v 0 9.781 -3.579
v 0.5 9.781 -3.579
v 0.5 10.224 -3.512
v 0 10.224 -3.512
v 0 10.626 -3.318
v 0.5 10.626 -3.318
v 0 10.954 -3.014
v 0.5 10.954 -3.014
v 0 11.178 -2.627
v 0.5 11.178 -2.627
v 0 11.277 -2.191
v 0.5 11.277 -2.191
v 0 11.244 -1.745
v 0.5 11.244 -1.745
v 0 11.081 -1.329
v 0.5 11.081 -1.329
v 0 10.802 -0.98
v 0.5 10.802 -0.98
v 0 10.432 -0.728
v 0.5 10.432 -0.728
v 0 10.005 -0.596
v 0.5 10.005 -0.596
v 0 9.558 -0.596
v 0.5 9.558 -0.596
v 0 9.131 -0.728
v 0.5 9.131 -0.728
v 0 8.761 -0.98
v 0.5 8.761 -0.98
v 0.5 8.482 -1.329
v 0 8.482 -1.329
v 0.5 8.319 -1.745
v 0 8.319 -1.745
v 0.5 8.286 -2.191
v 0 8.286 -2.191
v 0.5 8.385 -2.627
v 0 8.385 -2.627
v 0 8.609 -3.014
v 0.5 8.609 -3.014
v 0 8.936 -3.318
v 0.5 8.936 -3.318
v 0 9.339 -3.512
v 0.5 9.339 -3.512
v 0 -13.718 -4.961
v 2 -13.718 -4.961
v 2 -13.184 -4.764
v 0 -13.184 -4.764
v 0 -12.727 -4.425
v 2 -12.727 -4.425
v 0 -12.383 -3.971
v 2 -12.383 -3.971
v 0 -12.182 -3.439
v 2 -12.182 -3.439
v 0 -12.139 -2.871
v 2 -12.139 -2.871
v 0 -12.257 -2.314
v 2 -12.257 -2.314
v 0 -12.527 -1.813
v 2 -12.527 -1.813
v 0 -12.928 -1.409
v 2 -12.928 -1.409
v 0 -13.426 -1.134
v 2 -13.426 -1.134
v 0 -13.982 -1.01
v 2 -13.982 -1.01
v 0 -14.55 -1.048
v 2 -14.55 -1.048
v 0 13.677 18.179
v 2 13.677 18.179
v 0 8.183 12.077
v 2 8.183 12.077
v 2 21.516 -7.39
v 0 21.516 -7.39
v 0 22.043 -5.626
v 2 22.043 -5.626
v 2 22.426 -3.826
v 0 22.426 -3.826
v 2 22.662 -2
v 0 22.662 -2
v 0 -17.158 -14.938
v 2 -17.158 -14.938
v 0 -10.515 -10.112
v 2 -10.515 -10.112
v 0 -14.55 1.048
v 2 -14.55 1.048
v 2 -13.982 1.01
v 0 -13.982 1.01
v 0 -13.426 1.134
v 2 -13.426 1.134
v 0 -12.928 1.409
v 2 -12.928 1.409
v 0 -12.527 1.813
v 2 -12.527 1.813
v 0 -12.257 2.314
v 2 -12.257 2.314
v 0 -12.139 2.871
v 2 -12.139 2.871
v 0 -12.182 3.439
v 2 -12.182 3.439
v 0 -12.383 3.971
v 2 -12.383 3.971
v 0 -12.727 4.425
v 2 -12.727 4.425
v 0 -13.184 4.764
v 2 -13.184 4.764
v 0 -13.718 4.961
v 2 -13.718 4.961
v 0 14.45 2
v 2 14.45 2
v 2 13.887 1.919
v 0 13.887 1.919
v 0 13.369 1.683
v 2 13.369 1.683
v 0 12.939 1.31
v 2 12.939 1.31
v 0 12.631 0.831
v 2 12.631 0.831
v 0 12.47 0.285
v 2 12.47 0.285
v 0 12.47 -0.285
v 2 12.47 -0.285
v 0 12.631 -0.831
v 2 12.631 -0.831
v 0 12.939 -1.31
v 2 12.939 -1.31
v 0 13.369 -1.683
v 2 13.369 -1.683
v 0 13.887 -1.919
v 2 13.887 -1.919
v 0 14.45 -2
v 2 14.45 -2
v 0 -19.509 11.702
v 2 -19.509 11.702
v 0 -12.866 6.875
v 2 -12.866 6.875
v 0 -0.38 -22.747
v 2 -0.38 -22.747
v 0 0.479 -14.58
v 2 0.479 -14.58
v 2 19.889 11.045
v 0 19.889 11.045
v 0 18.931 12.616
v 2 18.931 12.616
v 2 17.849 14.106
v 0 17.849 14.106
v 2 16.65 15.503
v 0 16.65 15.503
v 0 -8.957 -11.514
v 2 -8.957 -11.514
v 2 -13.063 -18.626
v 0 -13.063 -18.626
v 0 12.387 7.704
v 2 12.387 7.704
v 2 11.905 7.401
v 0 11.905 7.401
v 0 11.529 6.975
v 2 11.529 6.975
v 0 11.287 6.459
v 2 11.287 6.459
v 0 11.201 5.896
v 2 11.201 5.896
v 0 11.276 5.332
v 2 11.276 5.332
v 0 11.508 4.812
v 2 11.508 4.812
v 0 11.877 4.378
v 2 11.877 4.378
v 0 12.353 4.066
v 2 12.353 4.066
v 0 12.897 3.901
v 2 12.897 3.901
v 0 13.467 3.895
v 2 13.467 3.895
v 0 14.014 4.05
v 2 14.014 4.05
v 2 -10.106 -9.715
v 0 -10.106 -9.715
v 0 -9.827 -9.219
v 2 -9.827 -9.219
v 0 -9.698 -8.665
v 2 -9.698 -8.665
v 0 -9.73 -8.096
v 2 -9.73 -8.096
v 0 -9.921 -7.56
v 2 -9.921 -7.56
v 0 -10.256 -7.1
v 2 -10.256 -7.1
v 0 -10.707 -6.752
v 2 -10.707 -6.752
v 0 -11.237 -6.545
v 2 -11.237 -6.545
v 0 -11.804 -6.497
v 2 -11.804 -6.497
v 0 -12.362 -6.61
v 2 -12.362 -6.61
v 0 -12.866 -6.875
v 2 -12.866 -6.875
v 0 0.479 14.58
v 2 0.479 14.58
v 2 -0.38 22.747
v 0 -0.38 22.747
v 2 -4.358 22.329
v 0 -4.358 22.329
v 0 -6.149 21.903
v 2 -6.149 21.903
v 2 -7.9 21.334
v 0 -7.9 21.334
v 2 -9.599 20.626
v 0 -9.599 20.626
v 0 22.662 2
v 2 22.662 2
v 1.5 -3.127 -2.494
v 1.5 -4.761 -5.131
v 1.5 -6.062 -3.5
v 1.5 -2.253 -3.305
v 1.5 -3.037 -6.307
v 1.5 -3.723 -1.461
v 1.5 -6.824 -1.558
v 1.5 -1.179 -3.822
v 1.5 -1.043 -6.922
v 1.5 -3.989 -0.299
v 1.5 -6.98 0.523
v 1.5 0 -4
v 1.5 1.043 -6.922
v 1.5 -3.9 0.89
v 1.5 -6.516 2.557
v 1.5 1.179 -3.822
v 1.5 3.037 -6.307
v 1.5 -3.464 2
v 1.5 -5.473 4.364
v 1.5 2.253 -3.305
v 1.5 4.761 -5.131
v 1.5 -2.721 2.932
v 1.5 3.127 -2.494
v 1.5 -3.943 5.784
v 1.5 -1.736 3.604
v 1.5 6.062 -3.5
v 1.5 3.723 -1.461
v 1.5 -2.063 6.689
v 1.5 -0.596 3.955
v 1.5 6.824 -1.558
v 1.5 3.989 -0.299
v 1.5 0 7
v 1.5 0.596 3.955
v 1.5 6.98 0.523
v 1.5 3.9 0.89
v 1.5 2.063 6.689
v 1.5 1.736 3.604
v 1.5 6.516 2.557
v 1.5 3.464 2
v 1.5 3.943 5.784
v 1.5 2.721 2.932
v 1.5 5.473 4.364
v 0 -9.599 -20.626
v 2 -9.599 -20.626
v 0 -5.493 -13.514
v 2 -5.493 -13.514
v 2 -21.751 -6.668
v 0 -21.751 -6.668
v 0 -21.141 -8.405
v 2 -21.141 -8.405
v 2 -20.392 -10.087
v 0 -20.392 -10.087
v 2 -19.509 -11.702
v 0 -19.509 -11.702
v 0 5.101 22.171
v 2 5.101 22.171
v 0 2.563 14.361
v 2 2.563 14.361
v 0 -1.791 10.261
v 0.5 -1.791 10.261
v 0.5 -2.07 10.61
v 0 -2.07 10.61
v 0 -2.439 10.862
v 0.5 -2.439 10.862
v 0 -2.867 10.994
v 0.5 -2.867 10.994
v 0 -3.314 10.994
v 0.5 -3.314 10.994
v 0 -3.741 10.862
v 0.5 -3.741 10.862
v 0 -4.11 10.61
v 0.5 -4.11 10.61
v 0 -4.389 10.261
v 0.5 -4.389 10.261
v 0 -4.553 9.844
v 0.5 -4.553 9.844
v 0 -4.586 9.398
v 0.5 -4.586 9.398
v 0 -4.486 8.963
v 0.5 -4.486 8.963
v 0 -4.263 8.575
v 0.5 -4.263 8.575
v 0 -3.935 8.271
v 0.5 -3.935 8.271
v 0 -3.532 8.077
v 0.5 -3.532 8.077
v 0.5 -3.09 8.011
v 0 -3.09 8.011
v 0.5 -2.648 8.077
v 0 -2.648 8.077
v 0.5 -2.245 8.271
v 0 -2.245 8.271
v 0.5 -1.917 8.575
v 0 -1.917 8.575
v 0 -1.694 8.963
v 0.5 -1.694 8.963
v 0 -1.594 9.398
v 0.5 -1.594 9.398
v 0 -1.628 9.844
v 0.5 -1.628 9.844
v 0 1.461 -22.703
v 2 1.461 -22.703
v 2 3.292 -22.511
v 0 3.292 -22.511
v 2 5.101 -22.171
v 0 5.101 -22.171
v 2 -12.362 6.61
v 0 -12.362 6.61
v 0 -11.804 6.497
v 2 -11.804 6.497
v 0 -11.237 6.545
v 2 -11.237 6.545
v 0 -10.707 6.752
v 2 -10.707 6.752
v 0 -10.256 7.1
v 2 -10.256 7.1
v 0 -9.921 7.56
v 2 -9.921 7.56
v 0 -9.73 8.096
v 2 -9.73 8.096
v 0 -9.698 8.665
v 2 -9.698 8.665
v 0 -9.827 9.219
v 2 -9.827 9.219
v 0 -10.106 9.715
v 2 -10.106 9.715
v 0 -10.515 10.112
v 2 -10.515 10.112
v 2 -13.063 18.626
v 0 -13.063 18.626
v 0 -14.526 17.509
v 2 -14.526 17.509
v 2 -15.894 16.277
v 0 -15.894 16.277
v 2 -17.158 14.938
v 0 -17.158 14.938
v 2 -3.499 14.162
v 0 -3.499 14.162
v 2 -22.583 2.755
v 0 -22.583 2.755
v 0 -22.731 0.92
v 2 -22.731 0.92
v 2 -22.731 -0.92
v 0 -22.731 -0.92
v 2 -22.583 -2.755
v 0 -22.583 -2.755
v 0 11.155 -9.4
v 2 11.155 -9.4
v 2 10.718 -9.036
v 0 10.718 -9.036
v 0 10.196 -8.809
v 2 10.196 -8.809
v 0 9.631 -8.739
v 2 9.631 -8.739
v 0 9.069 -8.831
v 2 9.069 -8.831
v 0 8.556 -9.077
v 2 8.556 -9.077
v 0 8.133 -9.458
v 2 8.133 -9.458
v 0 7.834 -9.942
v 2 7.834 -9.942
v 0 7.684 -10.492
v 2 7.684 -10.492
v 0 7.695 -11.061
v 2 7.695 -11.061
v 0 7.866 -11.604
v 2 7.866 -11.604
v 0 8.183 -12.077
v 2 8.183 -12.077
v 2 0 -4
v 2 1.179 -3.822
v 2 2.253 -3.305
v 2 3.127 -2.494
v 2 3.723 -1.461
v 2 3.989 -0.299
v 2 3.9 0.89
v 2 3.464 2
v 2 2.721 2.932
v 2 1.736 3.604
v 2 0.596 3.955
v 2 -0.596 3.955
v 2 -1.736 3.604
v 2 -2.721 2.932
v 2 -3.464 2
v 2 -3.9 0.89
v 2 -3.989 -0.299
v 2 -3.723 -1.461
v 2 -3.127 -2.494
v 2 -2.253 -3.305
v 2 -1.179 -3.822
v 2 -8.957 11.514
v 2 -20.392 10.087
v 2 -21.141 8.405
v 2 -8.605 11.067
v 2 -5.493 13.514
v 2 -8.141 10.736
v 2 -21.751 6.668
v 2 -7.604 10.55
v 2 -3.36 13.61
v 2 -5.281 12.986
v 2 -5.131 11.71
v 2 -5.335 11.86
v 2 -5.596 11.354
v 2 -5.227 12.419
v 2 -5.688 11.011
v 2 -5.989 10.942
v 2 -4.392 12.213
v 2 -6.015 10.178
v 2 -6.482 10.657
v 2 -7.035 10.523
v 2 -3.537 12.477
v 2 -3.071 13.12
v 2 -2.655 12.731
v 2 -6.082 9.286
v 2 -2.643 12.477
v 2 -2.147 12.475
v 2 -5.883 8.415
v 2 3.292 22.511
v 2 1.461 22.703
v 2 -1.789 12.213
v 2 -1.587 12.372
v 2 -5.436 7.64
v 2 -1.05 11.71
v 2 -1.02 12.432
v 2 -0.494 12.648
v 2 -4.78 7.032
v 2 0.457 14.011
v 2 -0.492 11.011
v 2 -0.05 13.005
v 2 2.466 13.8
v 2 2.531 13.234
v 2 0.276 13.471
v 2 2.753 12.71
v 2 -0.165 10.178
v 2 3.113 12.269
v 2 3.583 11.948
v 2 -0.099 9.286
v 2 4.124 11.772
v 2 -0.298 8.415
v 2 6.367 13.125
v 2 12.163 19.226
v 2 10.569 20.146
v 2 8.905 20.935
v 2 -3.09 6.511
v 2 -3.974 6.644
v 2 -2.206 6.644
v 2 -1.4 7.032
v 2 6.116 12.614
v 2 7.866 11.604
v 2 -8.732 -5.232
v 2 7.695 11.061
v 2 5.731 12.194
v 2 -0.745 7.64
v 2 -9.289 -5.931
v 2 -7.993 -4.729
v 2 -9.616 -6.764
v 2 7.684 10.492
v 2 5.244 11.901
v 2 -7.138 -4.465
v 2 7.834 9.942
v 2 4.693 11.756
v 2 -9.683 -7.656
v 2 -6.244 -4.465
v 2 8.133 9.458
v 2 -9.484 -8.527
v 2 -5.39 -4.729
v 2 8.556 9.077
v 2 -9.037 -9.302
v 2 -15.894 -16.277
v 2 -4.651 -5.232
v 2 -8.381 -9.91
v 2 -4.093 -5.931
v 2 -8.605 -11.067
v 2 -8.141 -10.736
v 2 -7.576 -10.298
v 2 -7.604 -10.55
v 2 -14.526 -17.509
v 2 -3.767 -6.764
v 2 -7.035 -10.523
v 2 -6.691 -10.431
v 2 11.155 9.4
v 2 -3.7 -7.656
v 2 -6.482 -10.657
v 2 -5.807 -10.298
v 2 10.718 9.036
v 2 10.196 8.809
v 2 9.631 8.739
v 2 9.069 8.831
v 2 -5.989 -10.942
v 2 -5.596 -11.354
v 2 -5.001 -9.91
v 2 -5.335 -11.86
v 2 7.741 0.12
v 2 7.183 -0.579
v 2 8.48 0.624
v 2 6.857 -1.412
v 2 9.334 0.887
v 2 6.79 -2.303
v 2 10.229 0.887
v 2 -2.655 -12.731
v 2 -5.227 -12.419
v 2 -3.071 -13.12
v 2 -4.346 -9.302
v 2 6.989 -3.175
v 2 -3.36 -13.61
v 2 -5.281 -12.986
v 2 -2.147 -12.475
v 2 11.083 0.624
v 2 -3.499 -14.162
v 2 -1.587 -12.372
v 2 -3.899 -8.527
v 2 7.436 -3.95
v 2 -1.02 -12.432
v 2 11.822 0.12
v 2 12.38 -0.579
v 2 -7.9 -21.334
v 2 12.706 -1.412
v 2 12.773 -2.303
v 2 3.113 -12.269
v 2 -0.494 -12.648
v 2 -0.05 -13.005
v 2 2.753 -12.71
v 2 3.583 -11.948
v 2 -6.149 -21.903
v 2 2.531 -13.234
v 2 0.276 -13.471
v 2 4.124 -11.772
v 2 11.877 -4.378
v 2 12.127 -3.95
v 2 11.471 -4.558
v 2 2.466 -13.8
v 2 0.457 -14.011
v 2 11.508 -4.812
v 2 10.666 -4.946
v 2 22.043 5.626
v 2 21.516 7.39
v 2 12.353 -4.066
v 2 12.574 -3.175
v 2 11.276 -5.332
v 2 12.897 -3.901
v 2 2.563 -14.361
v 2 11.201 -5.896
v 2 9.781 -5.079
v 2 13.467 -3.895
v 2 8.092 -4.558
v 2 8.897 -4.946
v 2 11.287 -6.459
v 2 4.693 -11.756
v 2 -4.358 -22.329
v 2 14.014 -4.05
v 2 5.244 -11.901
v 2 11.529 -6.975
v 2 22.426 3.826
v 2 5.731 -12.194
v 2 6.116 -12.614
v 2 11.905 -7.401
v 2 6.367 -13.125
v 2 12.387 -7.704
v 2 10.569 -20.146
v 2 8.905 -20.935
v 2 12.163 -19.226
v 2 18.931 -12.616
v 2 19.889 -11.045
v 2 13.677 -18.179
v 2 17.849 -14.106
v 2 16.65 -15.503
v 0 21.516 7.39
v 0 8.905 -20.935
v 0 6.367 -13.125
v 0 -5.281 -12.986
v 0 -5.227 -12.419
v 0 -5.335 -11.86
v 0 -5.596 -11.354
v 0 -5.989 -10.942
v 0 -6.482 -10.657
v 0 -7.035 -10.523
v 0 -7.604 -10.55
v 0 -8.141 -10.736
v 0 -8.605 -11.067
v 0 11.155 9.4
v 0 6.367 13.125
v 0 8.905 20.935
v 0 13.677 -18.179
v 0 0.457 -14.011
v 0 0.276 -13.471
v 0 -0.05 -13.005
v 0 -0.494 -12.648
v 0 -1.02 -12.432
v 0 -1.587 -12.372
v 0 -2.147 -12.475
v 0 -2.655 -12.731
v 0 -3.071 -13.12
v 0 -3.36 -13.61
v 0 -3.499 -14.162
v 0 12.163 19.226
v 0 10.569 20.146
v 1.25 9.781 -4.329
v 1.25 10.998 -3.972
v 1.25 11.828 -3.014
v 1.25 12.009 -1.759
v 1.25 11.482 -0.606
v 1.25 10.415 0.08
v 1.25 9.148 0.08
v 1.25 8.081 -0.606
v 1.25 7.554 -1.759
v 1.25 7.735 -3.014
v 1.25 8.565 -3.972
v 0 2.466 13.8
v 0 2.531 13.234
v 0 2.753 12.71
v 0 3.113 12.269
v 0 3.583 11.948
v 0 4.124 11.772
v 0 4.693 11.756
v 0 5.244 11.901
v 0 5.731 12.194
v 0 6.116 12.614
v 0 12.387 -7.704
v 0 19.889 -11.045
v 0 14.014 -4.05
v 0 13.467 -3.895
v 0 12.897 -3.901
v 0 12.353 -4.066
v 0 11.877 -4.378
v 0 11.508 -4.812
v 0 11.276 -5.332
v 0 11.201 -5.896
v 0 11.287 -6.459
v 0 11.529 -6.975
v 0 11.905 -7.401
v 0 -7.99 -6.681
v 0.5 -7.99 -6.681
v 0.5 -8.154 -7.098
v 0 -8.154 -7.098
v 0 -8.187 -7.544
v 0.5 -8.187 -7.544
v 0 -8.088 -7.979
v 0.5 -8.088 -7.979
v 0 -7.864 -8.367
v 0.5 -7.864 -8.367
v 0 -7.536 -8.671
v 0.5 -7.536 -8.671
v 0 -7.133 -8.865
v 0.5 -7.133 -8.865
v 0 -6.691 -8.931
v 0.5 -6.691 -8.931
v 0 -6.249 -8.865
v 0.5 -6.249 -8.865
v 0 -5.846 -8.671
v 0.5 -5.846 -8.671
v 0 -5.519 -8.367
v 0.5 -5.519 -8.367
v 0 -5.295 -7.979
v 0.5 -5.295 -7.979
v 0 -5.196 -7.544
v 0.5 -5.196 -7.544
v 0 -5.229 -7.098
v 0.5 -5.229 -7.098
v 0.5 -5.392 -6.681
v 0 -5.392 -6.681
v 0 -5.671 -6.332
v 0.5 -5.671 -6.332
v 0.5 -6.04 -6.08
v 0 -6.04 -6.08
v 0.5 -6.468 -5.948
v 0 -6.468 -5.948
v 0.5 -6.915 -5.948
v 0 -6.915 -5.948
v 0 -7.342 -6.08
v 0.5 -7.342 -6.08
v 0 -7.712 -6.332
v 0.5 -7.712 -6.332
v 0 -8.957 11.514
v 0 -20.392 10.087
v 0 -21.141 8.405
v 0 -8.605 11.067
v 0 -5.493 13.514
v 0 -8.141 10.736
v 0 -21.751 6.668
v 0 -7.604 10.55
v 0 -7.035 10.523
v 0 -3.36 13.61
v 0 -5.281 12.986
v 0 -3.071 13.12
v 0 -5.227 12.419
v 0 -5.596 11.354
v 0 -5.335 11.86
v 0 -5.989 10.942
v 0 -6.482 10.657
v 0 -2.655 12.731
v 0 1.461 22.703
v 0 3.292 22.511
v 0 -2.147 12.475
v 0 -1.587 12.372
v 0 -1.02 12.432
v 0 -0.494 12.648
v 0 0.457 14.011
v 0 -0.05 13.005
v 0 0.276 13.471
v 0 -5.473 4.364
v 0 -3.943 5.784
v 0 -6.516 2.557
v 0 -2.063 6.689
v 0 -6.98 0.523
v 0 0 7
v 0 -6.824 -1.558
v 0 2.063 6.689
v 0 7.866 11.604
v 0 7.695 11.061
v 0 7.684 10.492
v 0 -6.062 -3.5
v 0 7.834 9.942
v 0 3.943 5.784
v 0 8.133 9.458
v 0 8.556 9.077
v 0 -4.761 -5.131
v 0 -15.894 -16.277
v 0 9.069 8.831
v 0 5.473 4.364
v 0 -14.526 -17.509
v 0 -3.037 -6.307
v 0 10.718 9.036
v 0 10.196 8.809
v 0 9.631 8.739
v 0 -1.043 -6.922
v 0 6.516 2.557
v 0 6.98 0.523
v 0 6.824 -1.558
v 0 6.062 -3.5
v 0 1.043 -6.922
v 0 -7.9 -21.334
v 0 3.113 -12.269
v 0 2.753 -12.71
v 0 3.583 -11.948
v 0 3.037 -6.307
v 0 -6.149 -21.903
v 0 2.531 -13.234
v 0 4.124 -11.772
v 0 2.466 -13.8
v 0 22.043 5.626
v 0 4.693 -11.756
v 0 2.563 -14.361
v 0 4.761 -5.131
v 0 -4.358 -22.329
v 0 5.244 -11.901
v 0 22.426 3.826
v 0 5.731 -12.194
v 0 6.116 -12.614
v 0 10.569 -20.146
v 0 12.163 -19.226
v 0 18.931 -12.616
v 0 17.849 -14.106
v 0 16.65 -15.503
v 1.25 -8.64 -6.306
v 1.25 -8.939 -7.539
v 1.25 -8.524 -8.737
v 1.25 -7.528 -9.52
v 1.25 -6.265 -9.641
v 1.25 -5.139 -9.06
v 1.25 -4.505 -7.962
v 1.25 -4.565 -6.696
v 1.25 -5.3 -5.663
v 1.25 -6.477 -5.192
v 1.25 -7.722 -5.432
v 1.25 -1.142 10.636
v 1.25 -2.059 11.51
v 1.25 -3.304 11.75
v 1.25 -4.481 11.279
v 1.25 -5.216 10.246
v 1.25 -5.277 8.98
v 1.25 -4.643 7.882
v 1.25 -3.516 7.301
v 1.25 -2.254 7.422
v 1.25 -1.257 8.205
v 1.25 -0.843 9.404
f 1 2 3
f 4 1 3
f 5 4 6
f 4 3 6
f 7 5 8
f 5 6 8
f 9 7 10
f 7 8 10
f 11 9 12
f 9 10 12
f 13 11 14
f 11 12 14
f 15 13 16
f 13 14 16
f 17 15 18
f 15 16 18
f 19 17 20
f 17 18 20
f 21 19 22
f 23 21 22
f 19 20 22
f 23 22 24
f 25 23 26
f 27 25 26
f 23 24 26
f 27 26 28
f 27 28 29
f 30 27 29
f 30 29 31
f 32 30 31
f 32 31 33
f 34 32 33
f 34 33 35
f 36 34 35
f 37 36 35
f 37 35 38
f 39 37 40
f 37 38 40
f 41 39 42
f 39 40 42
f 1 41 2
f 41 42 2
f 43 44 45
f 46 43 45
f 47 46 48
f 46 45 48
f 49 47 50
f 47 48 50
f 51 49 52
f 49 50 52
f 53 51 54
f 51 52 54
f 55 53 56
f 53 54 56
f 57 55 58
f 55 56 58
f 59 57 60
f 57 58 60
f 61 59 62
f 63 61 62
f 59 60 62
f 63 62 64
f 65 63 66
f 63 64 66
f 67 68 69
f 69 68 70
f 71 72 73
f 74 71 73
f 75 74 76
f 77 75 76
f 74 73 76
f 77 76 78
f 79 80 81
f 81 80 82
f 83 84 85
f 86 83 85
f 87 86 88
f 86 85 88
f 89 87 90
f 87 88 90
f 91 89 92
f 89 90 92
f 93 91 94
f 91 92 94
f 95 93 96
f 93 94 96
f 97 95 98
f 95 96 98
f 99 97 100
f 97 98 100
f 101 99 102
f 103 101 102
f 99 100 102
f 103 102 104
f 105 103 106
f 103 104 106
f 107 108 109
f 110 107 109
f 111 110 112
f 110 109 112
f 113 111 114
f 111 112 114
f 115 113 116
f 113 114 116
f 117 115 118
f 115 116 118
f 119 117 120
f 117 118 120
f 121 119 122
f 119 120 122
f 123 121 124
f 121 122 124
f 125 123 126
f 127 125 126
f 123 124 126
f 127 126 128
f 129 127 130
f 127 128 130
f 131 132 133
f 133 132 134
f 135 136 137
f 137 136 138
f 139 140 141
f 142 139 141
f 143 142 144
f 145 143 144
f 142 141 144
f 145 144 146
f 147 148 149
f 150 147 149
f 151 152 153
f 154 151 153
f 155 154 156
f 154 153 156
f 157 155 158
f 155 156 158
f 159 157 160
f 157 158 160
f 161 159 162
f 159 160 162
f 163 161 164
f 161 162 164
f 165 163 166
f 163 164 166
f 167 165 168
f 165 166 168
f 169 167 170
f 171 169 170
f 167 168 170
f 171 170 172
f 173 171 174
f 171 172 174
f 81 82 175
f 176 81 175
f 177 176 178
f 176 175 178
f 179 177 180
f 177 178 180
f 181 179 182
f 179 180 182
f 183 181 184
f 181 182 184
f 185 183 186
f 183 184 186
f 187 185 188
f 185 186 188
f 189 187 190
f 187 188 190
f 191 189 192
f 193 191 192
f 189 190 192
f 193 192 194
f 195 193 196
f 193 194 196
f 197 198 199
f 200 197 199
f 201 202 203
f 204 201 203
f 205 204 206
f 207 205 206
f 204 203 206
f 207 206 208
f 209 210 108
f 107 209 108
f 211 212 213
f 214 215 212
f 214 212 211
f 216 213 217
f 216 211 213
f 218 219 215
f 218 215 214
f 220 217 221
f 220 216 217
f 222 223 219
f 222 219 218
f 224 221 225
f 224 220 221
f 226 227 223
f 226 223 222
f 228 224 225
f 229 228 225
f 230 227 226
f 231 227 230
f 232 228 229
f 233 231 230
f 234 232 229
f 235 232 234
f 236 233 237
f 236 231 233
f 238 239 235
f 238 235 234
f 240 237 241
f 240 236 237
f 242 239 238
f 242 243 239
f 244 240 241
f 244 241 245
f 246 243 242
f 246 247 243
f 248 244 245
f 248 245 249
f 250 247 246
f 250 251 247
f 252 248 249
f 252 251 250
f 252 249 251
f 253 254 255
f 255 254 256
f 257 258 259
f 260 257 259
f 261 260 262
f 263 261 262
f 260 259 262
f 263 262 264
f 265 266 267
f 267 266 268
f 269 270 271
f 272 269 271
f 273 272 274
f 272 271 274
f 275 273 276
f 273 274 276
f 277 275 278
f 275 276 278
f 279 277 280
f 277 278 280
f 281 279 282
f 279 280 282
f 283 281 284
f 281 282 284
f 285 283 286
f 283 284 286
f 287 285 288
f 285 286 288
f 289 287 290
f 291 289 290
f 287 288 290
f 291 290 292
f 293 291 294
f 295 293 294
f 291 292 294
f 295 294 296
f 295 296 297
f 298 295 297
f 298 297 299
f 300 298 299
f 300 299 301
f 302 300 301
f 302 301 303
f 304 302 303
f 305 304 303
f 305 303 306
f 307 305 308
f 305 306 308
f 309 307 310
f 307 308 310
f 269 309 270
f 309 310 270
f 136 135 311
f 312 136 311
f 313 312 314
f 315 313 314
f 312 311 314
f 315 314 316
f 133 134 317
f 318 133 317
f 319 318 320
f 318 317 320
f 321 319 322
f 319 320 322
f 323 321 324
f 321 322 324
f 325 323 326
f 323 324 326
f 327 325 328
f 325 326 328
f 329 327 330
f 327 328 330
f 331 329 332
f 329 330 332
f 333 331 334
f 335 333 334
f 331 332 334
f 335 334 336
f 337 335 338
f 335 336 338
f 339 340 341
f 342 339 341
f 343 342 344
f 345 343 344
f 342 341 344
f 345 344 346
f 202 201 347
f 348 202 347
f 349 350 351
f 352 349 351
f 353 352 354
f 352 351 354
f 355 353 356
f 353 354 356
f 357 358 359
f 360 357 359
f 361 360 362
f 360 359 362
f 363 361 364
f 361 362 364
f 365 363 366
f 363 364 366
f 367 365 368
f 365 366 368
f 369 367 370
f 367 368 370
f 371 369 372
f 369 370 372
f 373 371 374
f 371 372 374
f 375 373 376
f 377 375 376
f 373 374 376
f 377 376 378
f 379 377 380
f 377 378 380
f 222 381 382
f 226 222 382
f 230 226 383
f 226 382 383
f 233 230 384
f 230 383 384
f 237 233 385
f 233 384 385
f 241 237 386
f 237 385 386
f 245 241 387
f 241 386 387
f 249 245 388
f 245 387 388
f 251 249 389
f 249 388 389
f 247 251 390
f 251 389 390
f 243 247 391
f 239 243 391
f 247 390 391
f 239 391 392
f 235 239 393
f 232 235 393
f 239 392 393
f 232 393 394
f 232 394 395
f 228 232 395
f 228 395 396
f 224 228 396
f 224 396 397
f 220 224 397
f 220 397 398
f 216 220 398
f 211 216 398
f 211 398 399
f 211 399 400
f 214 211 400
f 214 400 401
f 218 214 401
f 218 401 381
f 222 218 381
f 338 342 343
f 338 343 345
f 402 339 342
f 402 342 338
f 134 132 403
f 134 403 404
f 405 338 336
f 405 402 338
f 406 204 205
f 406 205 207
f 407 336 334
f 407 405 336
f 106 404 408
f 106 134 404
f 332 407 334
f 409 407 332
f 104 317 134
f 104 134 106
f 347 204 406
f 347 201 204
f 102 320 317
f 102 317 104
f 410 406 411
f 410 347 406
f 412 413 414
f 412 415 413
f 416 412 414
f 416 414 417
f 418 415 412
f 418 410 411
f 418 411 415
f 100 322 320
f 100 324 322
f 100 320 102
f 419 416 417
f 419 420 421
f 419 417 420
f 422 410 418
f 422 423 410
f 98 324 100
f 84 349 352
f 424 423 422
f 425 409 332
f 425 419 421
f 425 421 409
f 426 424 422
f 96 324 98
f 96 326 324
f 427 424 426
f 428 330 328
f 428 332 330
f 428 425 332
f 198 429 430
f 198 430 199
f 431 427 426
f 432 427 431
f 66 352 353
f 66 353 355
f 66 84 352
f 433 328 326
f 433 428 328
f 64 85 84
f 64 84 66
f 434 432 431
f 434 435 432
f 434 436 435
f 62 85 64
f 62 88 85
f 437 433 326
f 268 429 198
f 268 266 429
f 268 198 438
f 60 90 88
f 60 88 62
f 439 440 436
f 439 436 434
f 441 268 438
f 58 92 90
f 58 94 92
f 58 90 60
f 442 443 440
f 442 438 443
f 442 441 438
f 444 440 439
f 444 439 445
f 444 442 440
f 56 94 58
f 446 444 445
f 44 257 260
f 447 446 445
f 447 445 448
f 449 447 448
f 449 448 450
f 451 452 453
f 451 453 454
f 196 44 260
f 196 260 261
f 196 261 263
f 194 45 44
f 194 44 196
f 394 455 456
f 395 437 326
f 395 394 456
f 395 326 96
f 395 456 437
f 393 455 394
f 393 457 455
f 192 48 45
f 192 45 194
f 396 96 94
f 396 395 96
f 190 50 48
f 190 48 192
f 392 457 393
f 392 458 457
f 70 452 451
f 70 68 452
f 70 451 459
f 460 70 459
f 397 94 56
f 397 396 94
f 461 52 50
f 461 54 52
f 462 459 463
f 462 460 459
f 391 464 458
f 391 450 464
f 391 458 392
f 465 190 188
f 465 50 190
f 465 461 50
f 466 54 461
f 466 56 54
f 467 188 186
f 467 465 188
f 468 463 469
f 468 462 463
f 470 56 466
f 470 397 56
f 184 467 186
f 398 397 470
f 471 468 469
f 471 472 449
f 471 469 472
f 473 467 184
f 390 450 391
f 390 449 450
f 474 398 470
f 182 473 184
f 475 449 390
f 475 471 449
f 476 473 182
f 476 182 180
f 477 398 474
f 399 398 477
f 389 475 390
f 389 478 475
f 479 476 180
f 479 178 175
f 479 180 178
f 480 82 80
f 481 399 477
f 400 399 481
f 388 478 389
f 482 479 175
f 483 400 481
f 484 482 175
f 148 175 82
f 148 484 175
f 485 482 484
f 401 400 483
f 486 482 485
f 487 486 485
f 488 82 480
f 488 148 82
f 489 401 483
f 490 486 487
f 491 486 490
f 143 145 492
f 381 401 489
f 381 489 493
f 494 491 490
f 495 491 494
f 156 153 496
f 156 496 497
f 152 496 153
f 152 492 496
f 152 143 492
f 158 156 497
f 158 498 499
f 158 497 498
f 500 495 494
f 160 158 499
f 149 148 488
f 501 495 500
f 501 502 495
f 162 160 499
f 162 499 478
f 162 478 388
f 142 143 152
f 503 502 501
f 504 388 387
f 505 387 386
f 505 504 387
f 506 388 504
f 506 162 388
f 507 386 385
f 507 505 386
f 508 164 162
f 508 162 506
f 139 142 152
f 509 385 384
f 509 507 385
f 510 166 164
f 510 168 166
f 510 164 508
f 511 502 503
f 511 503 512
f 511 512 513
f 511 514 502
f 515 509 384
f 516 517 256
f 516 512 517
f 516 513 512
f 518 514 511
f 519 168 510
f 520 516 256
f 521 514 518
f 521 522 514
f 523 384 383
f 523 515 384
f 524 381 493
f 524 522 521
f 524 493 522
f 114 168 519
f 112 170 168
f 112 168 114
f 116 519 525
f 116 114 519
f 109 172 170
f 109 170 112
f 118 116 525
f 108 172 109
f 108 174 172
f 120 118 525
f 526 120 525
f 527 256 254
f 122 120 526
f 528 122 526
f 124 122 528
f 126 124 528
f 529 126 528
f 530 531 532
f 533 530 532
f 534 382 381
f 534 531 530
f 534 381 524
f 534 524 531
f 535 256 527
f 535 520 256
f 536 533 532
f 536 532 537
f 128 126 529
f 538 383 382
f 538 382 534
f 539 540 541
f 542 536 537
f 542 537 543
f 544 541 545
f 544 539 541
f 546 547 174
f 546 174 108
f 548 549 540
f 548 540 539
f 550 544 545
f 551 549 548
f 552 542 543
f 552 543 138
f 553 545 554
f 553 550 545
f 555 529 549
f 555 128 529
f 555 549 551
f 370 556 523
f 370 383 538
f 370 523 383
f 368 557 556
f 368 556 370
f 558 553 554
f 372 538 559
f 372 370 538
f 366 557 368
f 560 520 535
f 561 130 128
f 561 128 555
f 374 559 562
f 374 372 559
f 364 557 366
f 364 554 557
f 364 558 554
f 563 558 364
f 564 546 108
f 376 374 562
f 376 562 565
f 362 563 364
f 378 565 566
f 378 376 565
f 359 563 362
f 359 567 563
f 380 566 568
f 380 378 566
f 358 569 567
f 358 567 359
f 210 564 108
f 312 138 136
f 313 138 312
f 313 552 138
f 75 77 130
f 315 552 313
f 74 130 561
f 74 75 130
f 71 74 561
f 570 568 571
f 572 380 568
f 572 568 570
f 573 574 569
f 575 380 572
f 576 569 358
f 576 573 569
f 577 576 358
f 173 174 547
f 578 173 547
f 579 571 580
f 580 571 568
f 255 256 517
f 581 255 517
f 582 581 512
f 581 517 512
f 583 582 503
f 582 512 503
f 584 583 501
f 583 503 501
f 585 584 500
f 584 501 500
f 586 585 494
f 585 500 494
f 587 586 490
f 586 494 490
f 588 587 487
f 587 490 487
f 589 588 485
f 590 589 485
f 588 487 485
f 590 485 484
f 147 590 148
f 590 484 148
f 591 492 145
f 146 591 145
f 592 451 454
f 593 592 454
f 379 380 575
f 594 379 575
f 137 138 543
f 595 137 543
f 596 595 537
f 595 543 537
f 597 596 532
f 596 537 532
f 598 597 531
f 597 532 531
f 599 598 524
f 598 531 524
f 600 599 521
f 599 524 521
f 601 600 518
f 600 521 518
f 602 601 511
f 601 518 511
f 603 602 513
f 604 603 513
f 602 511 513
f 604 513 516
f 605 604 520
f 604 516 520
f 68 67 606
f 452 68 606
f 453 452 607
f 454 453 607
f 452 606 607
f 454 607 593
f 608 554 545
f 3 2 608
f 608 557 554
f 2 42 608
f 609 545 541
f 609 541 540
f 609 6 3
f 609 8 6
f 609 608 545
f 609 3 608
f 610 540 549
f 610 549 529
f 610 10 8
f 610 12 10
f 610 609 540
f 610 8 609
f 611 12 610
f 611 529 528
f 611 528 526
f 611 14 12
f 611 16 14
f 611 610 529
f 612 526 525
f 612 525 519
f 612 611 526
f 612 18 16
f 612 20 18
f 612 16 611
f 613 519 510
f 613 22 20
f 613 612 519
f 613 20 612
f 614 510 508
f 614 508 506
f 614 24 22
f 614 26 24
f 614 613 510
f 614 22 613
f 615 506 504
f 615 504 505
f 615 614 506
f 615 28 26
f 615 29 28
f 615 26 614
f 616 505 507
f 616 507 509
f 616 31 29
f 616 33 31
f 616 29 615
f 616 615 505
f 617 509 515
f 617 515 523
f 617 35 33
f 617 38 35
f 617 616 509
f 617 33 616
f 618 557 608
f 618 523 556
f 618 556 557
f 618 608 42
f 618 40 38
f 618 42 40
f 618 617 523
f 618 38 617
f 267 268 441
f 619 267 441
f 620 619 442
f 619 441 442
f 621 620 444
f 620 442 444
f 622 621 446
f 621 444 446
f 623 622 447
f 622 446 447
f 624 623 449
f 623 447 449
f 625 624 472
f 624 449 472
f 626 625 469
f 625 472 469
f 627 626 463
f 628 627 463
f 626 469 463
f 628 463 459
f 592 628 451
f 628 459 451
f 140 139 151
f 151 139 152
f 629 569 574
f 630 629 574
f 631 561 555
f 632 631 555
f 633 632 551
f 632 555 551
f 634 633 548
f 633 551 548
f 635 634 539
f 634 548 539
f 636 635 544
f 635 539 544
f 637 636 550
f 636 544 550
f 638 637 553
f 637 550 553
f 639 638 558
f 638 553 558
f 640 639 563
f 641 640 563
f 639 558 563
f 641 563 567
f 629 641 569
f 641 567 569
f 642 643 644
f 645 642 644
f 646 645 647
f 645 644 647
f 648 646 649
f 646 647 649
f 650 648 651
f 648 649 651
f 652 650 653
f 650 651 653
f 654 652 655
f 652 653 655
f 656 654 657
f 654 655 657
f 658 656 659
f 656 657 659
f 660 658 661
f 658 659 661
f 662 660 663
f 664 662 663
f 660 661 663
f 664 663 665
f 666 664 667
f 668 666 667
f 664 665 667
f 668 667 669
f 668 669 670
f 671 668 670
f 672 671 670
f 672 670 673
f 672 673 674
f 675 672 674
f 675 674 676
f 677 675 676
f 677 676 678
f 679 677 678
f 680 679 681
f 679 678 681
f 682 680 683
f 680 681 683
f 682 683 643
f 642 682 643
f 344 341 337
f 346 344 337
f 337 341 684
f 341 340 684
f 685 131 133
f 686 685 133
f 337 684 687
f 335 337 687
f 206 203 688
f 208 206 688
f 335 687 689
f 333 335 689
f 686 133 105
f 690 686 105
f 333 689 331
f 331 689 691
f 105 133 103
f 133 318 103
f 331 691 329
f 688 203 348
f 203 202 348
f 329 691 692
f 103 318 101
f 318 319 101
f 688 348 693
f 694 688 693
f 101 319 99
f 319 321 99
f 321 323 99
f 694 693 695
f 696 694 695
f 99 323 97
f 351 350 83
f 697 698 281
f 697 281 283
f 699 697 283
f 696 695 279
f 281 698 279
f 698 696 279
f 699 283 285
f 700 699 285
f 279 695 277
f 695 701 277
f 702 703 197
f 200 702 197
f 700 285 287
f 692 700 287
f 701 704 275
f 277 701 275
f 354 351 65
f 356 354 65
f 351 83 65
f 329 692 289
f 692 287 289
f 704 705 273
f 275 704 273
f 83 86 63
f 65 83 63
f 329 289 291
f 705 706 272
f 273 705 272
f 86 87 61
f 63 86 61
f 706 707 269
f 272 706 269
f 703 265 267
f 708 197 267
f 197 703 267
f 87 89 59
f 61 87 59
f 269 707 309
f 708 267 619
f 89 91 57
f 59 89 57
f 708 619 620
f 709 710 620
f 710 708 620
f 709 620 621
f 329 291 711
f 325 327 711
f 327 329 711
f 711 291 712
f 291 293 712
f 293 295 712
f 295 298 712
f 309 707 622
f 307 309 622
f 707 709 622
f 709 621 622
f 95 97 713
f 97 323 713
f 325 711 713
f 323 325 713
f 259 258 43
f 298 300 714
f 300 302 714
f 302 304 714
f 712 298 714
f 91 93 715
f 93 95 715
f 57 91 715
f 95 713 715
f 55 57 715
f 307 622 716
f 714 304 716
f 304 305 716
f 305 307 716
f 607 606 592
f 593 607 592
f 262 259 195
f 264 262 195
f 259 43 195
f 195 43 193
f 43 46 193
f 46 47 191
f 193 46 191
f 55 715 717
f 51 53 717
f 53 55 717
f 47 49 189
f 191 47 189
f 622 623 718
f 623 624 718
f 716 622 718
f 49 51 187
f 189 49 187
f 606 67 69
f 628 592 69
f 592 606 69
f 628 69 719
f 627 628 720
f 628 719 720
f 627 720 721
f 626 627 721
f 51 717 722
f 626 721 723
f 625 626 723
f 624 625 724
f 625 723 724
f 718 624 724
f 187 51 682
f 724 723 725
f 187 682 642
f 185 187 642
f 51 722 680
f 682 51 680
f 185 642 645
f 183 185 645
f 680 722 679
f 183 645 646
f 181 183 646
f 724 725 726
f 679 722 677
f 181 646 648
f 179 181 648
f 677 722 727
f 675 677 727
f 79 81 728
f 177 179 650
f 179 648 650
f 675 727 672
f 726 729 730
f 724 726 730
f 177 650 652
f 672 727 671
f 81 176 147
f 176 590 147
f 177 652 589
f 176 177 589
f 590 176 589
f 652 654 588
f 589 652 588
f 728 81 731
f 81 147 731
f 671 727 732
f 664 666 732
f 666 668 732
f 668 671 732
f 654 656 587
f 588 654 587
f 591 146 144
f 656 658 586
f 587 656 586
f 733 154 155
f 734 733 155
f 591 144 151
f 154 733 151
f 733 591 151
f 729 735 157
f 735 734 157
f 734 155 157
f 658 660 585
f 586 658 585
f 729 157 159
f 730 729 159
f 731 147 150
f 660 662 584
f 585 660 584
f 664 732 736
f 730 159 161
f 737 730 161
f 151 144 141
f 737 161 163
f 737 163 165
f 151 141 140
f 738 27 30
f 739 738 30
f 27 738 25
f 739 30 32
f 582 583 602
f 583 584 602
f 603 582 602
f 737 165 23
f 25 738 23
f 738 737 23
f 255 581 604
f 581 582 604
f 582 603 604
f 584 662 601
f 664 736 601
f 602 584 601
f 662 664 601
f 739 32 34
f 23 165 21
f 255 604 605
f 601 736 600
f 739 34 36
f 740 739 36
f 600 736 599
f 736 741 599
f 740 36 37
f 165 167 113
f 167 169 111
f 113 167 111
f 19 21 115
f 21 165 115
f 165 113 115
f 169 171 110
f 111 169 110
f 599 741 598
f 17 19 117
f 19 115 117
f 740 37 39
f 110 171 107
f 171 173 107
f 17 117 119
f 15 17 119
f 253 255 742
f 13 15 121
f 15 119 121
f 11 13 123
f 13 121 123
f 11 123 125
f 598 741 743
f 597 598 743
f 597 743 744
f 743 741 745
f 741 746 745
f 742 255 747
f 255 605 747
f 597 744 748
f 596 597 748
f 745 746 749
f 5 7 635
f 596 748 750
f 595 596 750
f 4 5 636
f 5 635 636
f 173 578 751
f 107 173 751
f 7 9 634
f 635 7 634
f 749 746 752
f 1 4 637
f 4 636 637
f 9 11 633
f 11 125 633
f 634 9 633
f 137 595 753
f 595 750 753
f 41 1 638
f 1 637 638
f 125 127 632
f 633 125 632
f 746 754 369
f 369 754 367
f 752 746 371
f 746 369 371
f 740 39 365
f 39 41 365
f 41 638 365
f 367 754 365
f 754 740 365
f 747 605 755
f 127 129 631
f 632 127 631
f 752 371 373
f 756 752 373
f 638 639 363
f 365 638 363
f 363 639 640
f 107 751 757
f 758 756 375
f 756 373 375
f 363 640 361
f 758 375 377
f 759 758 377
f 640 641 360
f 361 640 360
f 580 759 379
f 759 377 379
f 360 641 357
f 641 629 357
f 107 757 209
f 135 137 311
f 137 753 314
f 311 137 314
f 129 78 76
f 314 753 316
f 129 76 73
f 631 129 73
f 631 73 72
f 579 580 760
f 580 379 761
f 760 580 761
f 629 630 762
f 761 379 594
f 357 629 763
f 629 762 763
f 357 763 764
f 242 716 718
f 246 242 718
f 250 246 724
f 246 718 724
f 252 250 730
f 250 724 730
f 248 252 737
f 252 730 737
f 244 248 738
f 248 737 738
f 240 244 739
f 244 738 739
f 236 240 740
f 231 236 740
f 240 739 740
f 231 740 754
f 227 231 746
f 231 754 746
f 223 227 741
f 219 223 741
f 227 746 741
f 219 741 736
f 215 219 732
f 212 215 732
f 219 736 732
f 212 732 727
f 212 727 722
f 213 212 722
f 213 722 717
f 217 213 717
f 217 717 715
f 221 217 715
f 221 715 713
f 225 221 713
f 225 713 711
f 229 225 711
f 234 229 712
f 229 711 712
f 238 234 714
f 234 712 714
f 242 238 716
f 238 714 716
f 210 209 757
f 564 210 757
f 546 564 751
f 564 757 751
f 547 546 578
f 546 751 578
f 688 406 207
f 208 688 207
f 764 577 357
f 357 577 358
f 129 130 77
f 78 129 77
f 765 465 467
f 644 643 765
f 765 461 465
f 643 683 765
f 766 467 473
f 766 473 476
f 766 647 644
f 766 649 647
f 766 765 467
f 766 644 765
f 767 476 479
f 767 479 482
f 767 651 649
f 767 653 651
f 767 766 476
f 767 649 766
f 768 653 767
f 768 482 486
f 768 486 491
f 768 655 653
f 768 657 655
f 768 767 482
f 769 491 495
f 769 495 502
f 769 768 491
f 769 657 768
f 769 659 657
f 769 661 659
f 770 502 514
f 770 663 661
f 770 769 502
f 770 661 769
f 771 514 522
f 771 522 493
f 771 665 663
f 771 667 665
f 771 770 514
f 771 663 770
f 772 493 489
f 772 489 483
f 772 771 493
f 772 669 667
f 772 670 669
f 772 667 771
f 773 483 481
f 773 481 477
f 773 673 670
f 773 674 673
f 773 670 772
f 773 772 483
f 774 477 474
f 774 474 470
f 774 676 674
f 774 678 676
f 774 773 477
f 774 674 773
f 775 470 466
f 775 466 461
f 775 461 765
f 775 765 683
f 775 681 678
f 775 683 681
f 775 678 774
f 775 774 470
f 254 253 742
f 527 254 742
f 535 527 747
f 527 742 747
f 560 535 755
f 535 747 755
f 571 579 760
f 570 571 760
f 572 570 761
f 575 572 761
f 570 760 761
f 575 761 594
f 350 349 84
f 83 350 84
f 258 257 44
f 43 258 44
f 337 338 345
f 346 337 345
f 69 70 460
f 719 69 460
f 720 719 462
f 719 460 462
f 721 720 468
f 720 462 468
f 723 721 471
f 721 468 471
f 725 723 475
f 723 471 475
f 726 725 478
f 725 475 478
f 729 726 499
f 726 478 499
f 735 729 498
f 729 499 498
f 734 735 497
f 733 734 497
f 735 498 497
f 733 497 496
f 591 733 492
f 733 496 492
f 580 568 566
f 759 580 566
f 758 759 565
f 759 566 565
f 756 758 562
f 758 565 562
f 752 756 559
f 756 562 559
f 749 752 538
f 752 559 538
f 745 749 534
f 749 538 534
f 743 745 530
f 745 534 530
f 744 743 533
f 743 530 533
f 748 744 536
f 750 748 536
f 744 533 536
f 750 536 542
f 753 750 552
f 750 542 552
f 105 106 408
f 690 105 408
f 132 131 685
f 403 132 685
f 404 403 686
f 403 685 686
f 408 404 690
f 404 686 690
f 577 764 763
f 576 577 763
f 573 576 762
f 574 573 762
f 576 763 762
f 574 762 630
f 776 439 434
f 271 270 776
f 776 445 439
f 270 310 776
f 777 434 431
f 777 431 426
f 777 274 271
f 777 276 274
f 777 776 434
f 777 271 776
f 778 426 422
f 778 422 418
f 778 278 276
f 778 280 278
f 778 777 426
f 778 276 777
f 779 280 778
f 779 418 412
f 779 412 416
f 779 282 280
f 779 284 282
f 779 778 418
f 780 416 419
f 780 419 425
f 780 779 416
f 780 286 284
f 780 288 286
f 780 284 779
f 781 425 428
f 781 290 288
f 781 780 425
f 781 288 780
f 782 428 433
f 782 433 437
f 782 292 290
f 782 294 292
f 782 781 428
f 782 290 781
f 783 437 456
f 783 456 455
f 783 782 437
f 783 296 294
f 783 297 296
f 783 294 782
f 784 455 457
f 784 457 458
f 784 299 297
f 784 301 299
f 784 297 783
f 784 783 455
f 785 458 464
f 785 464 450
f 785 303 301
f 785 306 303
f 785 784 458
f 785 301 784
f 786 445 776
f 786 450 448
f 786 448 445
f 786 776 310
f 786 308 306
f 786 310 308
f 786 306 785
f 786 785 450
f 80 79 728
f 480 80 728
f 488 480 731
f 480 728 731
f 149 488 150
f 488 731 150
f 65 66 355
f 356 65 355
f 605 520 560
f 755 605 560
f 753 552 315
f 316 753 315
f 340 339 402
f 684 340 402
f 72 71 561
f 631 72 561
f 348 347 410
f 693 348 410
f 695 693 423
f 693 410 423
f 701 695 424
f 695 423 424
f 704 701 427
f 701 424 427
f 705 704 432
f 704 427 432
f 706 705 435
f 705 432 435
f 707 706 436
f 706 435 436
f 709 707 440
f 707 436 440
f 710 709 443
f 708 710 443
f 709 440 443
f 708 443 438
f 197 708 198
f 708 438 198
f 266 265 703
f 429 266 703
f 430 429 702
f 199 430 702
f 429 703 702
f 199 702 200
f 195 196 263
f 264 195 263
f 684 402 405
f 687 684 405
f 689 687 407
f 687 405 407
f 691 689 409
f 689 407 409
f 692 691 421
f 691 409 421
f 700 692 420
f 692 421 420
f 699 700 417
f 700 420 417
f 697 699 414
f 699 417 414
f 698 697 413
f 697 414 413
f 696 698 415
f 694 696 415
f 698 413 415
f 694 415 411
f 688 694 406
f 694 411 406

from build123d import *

# Parameters (mm, degrees)
SKETCH1_R                    = 22.75
BOSS_EXTRUDE1_DEPTH          = 2
CUT_EXTRUDE2_REACH           = 4
SKETCH3_R                    = 4
SKETCH2_R                    = 1.5
CUT_EXTRUDE1_DEPTH           = 2
CHAMFER1_SIZE                = 1.5
CIRPATTERN1_COUNT            = 3
CHAMFER1_OF_CIRPATTERN1_SIZE = 1.5
CUT_EXTRUDE3_DEPTH           = 2
CIRPATTERN2_COUNT            = 15
SKETCH5_R                    = 7
CUT_EXTRUDE4_DEPTH           = 1.5


with BuildPart() as part:
    # Sketch1 → Boss-Extrude1 (new body)
    with BuildSketch(Plane(origin=(0, 0, 0), x_dir=(0, 0, -1), z_dir=(1, 0, 0))):
        Circle(SKETCH1_R)
    extrude(amount=BOSS_EXTRUDE1_DEPTH)

    # Sketch3 → Cut-Extrude2 (cut, up to next)
    with BuildSketch(Plane(origin=(2, 0, 0), x_dir=(0, 0, -1), z_dir=(1, 0, 0)), mode=Mode.PRIVATE) as cut_extrude2_sk1:
        Circle(SKETCH3_R)
    cut_extrude2_tool1 = extrude(cut_extrude2_sk1.sketch, amount=-CUT_EXTRUDE2_REACH, mode=Mode.PRIVATE) & part.part
    add(cut_extrude2_tool1.solids().sort_by_distance((2, 0, 0))[0], mode=Mode.SUBTRACT)

    # Sketch2 → Cut-Extrude1 (cut)
    with BuildSketch(Plane(origin=(2, 0, 0), x_dir=(0, 0, -1), z_dir=(1, 0, 0))):
        with Locations((2.079116908, 9.781476007)):
            Circle(SKETCH2_R)
    cut_extrude1 = extrude(amount=-CUT_EXTRUDE1_DEPTH, mode=Mode.SUBTRACT)

    # Chamfer1
    chamfer1_edges = [part.edges().sort_by_distance(p)[0] for p in [
        (2, 9.781476007, -0.579116908),
    ]]
    chamfer(chamfer1_edges, length=CHAMFER1_SIZE)

    # CirPattern1: Cut-Extrude1 ×3 about axis
    cirpattern1_axis = Axis((0, 0, 0), (1, 0, 0))
    for i in range(1, CIRPATTERN1_COUNT):
        add(cut_extrude1.rotate(cirpattern1_axis, i * 360 / CIRPATTERN1_COUNT), mode=Mode.SUBTRACT)

    # Chamfer1 of CirPattern1
    chamfer1_of_cirpattern1_edges = [part.edges().sort_by_distance(p)[0] for p in [
        (2, -4.389208049, 8.760565163),
        (2, -5.392267958, -8.181448255),
    ]]
    chamfer(chamfer1_of_cirpattern1_edges, length=CHAMFER1_OF_CIRPATTERN1_SIZE)

    # Sketch4 → Cut-Extrude3 (cut)
    with BuildSketch(Plane(origin=(2, 0, 0), x_dir=(0, 0, -1), z_dir=(1, 0, 0))):
        with BuildLine():
            Line((-2, 22.75), (-2, 14.45))
            ThreePointArc((-2, 14.45), (0, 12.45), (2, 14.45))
            Line((2, 14.45), (2, 22.75))
            Line((2, 22.75), (-2, 22.75))
        make_face()
    cut_extrude3 = extrude(amount=-CUT_EXTRUDE3_DEPTH, mode=Mode.SUBTRACT)

    # CirPattern2: Cut-Extrude3 ×15 about axis
    cirpattern2_axis = Axis((0, 0, 0), (1, 0, 0))
    for i in range(1, CIRPATTERN2_COUNT):
        add(cut_extrude3.rotate(cirpattern2_axis, i * 360 / CIRPATTERN2_COUNT), mode=Mode.SUBTRACT)

    # Sketch5 → Cut-Extrude4 (cut)
    with BuildSketch(Plane.ZY):
        Circle(SKETCH5_R)
    extrude(amount=-CUT_EXTRUDE4_DEPTH, mode=Mode.SUBTRACT)


solid = part.part
